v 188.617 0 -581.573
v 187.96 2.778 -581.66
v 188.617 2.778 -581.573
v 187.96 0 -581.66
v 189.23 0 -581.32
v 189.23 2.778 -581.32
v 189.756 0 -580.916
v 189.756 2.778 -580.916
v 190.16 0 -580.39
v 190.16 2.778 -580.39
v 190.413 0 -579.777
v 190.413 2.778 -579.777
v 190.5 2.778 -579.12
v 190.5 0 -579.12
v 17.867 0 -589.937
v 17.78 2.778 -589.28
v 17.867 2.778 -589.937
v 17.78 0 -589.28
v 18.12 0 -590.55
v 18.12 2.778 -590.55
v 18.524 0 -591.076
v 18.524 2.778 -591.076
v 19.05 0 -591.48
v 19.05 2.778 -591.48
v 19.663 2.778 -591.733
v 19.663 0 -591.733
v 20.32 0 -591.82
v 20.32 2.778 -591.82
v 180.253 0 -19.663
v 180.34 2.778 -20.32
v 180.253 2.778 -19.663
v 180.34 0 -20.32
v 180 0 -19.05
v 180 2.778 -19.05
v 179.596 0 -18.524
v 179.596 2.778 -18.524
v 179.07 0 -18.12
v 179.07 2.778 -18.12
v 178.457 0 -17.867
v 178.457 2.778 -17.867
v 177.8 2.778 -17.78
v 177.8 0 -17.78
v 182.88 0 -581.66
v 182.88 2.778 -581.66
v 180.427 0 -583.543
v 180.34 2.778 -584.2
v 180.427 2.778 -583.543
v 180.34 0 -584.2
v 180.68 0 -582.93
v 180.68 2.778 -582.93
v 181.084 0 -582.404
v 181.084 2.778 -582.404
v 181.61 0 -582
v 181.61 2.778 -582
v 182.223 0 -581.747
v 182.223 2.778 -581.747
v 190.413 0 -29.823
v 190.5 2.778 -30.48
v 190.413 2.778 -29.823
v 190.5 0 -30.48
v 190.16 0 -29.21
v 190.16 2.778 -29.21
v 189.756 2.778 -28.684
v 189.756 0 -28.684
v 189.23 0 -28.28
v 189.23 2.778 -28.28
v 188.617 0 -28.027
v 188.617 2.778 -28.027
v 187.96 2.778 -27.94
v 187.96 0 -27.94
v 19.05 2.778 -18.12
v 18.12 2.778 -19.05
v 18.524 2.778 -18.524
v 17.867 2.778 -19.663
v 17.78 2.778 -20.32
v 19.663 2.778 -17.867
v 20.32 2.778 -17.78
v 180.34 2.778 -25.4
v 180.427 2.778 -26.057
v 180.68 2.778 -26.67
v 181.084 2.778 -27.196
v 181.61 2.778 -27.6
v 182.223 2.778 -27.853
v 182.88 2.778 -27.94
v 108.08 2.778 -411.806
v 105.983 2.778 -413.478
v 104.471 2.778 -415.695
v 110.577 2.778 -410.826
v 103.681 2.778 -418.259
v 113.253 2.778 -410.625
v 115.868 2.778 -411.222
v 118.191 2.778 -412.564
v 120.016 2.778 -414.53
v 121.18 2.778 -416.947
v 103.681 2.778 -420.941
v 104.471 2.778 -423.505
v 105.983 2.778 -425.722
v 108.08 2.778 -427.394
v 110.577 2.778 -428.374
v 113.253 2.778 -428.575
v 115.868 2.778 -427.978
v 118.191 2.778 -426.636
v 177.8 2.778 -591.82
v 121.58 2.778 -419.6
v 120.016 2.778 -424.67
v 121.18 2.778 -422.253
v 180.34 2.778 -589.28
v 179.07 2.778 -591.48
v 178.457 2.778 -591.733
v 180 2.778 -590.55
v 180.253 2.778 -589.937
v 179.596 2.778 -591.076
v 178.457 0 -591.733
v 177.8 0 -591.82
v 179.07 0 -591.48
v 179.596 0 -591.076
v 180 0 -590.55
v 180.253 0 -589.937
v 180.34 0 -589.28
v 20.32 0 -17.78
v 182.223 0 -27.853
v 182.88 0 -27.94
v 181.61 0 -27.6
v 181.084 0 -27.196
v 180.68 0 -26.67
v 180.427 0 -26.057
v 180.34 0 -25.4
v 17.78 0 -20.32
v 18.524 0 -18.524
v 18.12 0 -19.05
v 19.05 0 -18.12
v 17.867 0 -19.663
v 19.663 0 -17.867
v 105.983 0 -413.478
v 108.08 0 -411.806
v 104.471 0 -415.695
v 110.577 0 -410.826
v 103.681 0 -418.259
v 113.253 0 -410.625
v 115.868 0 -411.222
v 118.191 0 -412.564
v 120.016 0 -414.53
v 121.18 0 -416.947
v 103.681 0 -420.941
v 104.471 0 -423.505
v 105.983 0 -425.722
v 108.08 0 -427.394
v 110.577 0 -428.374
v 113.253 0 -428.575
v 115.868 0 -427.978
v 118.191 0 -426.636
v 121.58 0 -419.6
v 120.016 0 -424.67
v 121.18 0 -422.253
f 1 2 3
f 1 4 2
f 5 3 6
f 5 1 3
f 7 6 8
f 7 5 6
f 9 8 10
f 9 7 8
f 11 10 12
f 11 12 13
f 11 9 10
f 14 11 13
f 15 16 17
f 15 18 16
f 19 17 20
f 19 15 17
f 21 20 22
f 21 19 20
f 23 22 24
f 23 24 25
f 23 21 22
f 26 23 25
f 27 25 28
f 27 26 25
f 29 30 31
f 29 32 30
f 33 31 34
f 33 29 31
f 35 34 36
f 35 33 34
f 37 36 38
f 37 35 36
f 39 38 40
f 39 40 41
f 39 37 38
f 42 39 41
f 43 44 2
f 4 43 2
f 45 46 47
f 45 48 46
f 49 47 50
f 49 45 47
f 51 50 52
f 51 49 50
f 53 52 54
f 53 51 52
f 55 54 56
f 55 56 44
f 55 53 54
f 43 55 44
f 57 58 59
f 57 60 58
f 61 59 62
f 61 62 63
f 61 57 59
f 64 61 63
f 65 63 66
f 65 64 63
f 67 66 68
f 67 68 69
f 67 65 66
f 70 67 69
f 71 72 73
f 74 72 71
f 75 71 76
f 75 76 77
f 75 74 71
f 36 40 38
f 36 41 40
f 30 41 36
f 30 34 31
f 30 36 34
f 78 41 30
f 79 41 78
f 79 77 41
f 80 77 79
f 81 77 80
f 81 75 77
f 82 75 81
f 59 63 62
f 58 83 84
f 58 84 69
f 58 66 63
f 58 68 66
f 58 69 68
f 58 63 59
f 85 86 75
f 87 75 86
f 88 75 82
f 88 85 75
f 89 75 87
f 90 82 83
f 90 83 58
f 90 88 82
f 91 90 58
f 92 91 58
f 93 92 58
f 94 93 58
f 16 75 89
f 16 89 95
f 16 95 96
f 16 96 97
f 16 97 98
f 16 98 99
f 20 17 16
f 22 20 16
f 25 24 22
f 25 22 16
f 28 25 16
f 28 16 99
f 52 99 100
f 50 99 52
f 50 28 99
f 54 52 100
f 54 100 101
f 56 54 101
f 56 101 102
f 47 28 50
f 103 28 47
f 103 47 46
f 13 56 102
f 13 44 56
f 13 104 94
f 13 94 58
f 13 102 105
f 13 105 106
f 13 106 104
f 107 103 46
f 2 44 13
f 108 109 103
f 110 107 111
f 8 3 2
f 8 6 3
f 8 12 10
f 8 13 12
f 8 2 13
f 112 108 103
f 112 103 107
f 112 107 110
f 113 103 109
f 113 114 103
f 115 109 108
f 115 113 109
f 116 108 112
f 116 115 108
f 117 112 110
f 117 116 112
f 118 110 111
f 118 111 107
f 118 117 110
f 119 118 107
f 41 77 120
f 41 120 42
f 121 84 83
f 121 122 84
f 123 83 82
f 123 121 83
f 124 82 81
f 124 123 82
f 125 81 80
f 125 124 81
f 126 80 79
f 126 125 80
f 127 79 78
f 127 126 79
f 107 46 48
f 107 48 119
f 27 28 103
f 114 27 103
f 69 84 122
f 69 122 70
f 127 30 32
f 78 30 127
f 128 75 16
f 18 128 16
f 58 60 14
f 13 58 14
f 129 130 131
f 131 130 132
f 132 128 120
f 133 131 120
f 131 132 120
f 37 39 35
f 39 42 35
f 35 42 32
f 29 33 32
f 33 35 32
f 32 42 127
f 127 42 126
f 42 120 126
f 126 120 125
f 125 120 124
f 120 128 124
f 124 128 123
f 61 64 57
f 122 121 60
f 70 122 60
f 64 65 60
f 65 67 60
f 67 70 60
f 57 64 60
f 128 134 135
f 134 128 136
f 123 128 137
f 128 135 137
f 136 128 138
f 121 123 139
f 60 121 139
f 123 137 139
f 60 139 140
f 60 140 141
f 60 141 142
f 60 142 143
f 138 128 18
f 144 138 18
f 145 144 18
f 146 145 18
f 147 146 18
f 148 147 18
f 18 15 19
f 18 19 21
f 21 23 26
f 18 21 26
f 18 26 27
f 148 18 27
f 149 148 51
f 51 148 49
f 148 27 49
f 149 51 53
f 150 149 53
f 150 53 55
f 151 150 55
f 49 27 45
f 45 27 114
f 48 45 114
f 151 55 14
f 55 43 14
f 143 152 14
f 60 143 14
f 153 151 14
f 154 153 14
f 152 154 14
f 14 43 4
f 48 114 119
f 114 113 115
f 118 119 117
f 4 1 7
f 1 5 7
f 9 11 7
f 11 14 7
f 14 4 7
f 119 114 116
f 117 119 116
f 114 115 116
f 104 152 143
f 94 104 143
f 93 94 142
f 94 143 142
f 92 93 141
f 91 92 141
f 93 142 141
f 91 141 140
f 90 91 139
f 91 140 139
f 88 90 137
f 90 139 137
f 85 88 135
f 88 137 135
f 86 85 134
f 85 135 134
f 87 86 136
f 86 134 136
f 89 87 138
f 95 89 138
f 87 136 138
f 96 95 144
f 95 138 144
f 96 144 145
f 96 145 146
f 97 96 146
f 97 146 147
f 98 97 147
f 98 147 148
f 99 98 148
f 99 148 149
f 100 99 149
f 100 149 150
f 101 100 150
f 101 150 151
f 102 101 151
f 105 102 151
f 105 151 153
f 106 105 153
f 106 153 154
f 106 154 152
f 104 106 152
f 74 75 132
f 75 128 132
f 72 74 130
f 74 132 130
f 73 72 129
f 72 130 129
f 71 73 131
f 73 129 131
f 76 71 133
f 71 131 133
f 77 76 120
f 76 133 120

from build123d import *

# Parameters (mm, degrees)
SKETCH1_W           = 190.5
SKETCH1_H           = 609.6
BOSS_EXTRUDE1_DEPTH = 2.778125
SKETCH2_W           = 190.5
SKETCH2_H           = 17.78
CUT_EXTRUDE1_DEPTH  = 3.778125
SKETCH3_W           = 17.78
SKETCH3_H           = 574.04
CUT_EXTRUDE2_DEPTH  = 3.778125
SKETCH4_W           = 10.16
SKETCH4_H           = 10.16
CUT_EXTRUDE3_DEPTH  = 3.778125
FILLET1_R           = 2.54
SKETCH5_R           = 9
CUT_EXTRUDE4_DEPTH  = 3.778125


with BuildPart() as part:
    # Sketch1 → Boss-Extrude1 (new body)
    with BuildSketch(Plane(origin=(0, 0, 0), x_dir=(1, 0, 0), z_dir=(0, 1, 0))):
        with Locations((95.25, 304.8)):
            Rectangle(SKETCH1_W, SKETCH1_H)
    extrude(amount=BOSS_EXTRUDE1_DEPTH)

    # Sketch2 → Cut-Extrude1 (cut, through all)
    with BuildSketch(Plane(origin=(0, 2.778125, 0), x_dir=(1, 0, 0), z_dir=(0, 1, 0))):
        with Locations((95.25, 8.89)):
            Rectangle(SKETCH2_W, SKETCH2_H)
        with Locations((95.25, 600.71)):
            Rectangle(SKETCH2_W, SKETCH2_H)
    extrude(amount=-CUT_EXTRUDE1_DEPTH, mode=Mode.SUBTRACT)

    # Sketch3 → Cut-Extrude2 (cut, through all)
    with BuildSketch(Plane(origin=(0, 2.778125, 0), x_dir=(1, 0, 0), z_dir=(0, 1, 0))):
        with Locations((8.89, 304.8)):
            Rectangle(SKETCH3_W, SKETCH3_H)
    extrude(amount=-CUT_EXTRUDE2_DEPTH, mode=Mode.SUBTRACT)

    # Sketch4 → Cut-Extrude3 (cut, through all)
    with BuildSketch(Plane(origin=(0, 2.778125, 0), x_dir=(1, 0, 0), z_dir=(0, 1, 0))):
        with Locations((185.42, 586.74)):
            Rectangle(SKETCH4_W, SKETCH4_H)
        with Locations((185.42, 22.86)):
            Rectangle(SKETCH4_W, SKETCH4_H)
    extrude(amount=-CUT_EXTRUDE3_DEPTH, mode=Mode.SUBTRACT)

    # Fillet1
    fillet1_edges = [part.edges().sort_by_distance(p)[0] for p in [
        (17.78, 1.3890625, -591.82),
        (17.78, 1.3890625, -17.78),
        (190.5, 1.3890625, -581.66),
        (180.34, 1.3890625, -581.66),
        (180.34, 1.3890625, -591.82),
        (190.5, 1.3890625, -27.94),
        (180.34, 1.3890625, -17.78),
        (180.34, 1.3890625, -27.94),
    ]]
    fillet(fillet1_edges, radius=FILLET1_R)

    # Sketch5 → Cut-Extrude4 (cut, through all)
    with BuildSketch(Plane.XZ):
        with Locations((112.58, -419.599999967)):
            Circle(SKETCH5_R)
    extrude(amount=-CUT_EXTRUDE4_DEPTH, mode=Mode.SUBTRACT)


solid = part.part
